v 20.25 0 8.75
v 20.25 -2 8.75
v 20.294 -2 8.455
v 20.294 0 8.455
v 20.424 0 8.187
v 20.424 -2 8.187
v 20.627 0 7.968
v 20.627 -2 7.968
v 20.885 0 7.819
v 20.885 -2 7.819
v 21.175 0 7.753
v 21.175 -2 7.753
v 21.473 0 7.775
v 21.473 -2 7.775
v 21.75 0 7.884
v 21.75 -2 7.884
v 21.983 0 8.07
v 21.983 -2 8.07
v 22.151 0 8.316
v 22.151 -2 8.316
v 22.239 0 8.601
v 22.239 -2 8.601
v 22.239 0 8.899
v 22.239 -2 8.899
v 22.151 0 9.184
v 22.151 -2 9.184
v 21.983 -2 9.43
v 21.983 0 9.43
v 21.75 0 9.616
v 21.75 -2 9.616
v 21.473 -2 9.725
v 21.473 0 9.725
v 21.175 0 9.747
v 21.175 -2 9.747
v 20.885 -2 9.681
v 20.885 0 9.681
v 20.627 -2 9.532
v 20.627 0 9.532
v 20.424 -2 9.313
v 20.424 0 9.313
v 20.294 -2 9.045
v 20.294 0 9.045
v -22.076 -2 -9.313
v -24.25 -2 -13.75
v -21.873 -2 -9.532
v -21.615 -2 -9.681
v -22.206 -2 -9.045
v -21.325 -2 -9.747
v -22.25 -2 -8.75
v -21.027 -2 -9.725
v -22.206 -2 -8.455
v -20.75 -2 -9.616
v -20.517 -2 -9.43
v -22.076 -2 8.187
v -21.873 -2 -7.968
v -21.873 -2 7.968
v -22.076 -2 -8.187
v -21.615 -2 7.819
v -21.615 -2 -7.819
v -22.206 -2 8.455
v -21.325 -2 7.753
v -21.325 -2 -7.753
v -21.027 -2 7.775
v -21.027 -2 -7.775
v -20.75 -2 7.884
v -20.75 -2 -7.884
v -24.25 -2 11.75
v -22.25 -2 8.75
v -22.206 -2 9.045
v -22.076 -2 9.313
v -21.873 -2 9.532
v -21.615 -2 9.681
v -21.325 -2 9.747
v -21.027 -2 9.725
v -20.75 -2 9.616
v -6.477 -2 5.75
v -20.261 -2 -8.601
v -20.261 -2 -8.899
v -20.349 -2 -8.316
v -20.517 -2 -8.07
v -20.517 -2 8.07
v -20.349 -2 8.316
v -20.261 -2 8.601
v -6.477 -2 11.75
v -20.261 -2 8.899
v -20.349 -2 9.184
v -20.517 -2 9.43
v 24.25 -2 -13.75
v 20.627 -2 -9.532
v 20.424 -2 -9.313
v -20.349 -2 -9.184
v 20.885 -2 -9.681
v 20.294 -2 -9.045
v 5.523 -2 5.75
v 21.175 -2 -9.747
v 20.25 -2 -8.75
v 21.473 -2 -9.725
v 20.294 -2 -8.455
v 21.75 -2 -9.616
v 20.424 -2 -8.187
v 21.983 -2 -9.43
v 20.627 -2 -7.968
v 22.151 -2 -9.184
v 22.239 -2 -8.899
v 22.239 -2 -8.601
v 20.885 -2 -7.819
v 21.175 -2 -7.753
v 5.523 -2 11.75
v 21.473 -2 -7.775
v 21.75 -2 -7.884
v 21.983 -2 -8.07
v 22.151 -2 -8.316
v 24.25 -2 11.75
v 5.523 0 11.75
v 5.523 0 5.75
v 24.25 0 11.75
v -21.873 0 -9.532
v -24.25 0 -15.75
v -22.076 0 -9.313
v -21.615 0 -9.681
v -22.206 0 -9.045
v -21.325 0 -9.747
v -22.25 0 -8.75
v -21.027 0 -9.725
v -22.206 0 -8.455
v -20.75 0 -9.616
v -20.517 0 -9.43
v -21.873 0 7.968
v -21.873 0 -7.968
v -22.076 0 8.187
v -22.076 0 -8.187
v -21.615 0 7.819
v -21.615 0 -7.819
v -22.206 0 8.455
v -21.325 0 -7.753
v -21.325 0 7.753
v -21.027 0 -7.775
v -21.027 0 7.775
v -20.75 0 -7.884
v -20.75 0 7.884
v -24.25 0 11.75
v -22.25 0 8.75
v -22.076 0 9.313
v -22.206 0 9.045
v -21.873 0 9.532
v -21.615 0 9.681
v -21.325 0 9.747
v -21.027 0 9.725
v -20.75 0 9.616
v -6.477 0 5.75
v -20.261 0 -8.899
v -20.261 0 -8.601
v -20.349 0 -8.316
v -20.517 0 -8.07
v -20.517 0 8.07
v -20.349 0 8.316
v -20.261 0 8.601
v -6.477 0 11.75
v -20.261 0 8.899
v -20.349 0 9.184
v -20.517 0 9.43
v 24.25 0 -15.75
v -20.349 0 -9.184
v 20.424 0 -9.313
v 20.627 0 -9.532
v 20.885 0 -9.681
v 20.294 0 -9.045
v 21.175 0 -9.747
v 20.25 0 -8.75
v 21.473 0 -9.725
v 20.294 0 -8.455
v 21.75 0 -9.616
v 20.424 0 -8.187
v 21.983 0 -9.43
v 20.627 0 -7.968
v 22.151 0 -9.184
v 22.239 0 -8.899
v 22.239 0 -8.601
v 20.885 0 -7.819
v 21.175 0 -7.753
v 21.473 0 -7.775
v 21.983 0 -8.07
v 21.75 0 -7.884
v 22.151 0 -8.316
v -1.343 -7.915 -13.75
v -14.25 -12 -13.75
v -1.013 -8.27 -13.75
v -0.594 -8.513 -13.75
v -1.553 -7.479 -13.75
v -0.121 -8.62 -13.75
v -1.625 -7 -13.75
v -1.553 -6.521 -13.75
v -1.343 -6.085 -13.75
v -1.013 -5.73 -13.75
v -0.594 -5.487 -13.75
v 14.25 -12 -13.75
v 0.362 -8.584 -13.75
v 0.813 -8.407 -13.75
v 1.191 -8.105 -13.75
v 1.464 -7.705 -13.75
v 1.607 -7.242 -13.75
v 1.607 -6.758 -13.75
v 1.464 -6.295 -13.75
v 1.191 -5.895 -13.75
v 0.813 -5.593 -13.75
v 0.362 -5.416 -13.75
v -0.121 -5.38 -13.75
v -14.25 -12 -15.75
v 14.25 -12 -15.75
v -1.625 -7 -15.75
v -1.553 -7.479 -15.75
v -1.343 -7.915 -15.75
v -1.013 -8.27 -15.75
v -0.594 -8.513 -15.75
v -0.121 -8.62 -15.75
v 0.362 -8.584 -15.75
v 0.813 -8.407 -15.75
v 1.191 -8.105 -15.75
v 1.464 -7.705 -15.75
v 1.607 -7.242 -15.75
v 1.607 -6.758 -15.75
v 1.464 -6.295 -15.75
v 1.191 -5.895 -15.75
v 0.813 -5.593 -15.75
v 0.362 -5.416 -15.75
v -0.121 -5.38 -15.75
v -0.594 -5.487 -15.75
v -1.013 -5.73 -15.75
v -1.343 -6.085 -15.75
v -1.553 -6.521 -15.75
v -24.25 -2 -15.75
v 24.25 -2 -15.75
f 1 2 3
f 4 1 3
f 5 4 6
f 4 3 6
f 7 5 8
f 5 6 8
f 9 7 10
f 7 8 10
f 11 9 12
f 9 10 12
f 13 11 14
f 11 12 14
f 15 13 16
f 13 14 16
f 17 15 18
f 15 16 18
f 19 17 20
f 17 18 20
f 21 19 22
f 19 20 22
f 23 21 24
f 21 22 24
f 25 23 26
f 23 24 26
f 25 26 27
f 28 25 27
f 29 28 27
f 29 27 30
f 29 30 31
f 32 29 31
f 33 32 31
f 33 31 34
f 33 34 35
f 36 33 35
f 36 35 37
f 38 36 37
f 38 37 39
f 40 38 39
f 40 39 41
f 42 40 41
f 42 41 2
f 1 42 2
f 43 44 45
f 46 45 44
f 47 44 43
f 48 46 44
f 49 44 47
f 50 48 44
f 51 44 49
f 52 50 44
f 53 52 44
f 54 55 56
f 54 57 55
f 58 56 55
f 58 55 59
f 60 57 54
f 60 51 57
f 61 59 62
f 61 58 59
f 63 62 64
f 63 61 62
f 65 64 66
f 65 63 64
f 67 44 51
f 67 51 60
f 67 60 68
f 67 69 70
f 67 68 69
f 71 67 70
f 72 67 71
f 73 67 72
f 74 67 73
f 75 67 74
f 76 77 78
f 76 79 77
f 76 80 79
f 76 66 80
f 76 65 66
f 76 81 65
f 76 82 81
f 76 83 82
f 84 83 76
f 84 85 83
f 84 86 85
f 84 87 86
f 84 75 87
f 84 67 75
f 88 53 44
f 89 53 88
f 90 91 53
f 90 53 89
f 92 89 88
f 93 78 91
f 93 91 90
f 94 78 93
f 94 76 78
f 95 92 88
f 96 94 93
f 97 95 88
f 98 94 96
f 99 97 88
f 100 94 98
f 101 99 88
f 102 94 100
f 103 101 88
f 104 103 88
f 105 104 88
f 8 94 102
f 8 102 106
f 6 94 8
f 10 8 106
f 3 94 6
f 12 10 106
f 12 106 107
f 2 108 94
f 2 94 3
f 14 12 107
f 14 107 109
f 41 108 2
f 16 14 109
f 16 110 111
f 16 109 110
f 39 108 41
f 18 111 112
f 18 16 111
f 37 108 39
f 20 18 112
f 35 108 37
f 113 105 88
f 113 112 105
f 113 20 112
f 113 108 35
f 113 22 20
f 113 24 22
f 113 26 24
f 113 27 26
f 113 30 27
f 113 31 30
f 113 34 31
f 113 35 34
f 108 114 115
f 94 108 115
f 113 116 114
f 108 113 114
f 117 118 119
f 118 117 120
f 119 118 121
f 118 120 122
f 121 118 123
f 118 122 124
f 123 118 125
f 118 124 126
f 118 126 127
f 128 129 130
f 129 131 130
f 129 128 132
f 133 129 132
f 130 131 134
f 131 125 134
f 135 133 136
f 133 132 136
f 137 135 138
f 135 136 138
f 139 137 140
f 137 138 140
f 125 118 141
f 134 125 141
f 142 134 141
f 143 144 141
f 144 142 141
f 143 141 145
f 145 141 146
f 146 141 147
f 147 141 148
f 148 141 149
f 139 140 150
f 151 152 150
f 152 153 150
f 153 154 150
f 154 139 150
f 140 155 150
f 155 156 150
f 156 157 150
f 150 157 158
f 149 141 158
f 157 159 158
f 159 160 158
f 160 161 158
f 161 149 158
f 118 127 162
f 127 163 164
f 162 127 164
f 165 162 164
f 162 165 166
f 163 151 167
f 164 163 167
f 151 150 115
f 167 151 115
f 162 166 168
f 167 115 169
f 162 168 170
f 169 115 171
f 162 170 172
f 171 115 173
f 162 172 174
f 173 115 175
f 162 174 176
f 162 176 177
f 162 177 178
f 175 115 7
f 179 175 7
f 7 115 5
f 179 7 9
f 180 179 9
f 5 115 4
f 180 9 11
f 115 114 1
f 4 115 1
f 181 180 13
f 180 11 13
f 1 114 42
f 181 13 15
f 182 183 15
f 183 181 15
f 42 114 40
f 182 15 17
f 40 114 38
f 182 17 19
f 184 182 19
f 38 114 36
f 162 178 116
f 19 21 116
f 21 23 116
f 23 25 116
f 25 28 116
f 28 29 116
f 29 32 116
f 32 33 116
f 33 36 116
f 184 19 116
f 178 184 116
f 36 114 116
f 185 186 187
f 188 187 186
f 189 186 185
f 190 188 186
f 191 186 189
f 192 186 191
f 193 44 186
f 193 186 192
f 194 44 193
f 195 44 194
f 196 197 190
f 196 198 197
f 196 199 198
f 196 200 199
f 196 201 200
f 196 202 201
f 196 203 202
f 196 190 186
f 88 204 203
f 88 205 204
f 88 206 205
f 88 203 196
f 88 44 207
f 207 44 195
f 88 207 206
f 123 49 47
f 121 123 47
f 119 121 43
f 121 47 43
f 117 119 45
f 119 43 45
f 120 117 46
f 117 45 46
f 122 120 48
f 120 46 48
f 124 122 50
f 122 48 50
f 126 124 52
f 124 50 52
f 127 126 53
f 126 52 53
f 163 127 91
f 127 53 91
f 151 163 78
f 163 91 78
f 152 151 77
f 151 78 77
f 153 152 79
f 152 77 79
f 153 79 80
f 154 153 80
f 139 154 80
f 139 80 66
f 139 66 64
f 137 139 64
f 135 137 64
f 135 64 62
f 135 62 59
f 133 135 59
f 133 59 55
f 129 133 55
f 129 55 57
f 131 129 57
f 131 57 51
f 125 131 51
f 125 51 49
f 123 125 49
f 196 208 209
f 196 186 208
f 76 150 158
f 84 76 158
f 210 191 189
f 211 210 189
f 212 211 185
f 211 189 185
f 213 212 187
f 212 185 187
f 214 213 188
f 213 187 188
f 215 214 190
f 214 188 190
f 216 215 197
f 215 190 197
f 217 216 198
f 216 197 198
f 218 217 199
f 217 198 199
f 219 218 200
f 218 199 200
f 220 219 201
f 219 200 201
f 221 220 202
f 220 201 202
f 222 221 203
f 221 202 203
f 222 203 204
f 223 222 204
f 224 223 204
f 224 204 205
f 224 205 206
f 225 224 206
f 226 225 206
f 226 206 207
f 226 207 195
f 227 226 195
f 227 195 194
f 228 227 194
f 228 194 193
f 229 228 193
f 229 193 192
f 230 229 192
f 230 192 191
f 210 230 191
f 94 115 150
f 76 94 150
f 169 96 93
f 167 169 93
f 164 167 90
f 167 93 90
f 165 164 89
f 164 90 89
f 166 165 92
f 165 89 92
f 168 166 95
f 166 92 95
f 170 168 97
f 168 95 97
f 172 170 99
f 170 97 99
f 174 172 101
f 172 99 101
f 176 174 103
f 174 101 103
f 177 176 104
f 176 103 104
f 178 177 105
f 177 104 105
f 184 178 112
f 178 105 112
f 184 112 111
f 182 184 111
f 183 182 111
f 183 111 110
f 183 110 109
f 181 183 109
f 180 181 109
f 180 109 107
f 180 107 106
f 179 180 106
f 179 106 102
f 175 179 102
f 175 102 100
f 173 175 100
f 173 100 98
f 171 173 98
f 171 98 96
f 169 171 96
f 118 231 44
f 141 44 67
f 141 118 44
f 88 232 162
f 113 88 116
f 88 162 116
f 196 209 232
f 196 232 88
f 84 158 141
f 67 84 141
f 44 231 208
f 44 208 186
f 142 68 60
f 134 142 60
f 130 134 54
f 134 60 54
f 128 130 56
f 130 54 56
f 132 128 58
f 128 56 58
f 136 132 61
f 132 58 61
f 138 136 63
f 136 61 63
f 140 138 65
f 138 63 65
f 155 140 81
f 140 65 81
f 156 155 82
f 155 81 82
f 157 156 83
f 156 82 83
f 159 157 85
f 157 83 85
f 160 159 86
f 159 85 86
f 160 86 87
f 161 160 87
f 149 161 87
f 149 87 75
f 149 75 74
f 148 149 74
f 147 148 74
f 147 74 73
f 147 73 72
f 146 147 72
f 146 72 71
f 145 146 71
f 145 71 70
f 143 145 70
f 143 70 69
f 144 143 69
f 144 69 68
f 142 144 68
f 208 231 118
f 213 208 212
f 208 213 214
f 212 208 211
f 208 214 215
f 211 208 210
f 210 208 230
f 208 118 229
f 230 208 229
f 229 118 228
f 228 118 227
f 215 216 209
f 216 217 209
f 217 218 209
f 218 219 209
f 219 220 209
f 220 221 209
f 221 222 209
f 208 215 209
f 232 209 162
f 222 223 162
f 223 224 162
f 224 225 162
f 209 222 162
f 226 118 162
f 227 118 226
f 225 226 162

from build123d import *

# Parameters (mm, degrees)
F2_DEPTH = 2
F3_D     = 2
F4_D     = 2
F5_D     = 2
F6_D     = 2
F1_W     = 48.5
F1_H     = 2
F7_DEPTH = 12
F8_SIZE  = 10
F9_SIZE  = 10
F12_D    = 3.25


with BuildPart() as f2:
    # F0 (on Front) → F2 (new body)
    with BuildSketch(Plane.XZ):
        Polygon((-24.25, 11.75), (-24.25, -13.75), (24.25, -13.75), (24.25, 11.75), (5.5228731483, 11.75), (5.5228731483, 5.75), (-6.4771268517, 5.75), (-6.4771268517, 11.75), align=None)
    extrude(amount=F2_DEPTH)

    # F3 (through all)
    with Locations(Plane(origin=(0, 0, 0), x_dir=(1, 0, 0), z_dir=(0, 1, 0))):
        with Locations((-21.25, -8.75)):
            Hole(F3_D / 2)

    # F4 (through all)
    with Locations(Plane(origin=(0, 0, 0), x_dir=(1, 0, 0), z_dir=(0, 1, 0))):
        with Locations((-21.25, 8.75)):
            Hole(F4_D / 2)

    # F5 (through all)
    with Locations(Plane(origin=(0, 0, 0), x_dir=(1, 0, 0), z_dir=(0, 1, 0))):
        with Locations((21.25, -8.75)):
            Hole(F5_D / 2)

    # F6 (through all)
    with Locations(Plane(origin=(0, 0, 0), x_dir=(1, 0, 0), z_dir=(0, 1, 0))):
        with Locations((21.25, 8.75)):
            Hole(F6_D / 2)

    # F1 (on Front) → F7 (join)
    with BuildSketch(Plane.XZ):
        with Locations((0, -14.75)):
            Rectangle(F1_W, F1_H)
    extrude(amount=F7_DEPTH)

    # F8
    f8_edges = [f2.edges().sort_by_distance(p)[0] for p in [
        (24.25, -12, -14.75),
    ]]
    chamfer(f8_edges, length=F8_SIZE)

    # F9
    f9_edges = [f2.edges().sort_by_distance(p)[0] for p in [
        (-24.25, -12, -14.75),
    ]]
    chamfer(f9_edges, length=F9_SIZE)

    # F12 (through all)
    with Locations(Plane(origin=(0, 0, -15.75), x_dir=(1, 0, 0), z_dir=(0, 0, -1))):
        with Locations((0, 7)):
            Hole(F12_D / 2)


solid = f2.part
